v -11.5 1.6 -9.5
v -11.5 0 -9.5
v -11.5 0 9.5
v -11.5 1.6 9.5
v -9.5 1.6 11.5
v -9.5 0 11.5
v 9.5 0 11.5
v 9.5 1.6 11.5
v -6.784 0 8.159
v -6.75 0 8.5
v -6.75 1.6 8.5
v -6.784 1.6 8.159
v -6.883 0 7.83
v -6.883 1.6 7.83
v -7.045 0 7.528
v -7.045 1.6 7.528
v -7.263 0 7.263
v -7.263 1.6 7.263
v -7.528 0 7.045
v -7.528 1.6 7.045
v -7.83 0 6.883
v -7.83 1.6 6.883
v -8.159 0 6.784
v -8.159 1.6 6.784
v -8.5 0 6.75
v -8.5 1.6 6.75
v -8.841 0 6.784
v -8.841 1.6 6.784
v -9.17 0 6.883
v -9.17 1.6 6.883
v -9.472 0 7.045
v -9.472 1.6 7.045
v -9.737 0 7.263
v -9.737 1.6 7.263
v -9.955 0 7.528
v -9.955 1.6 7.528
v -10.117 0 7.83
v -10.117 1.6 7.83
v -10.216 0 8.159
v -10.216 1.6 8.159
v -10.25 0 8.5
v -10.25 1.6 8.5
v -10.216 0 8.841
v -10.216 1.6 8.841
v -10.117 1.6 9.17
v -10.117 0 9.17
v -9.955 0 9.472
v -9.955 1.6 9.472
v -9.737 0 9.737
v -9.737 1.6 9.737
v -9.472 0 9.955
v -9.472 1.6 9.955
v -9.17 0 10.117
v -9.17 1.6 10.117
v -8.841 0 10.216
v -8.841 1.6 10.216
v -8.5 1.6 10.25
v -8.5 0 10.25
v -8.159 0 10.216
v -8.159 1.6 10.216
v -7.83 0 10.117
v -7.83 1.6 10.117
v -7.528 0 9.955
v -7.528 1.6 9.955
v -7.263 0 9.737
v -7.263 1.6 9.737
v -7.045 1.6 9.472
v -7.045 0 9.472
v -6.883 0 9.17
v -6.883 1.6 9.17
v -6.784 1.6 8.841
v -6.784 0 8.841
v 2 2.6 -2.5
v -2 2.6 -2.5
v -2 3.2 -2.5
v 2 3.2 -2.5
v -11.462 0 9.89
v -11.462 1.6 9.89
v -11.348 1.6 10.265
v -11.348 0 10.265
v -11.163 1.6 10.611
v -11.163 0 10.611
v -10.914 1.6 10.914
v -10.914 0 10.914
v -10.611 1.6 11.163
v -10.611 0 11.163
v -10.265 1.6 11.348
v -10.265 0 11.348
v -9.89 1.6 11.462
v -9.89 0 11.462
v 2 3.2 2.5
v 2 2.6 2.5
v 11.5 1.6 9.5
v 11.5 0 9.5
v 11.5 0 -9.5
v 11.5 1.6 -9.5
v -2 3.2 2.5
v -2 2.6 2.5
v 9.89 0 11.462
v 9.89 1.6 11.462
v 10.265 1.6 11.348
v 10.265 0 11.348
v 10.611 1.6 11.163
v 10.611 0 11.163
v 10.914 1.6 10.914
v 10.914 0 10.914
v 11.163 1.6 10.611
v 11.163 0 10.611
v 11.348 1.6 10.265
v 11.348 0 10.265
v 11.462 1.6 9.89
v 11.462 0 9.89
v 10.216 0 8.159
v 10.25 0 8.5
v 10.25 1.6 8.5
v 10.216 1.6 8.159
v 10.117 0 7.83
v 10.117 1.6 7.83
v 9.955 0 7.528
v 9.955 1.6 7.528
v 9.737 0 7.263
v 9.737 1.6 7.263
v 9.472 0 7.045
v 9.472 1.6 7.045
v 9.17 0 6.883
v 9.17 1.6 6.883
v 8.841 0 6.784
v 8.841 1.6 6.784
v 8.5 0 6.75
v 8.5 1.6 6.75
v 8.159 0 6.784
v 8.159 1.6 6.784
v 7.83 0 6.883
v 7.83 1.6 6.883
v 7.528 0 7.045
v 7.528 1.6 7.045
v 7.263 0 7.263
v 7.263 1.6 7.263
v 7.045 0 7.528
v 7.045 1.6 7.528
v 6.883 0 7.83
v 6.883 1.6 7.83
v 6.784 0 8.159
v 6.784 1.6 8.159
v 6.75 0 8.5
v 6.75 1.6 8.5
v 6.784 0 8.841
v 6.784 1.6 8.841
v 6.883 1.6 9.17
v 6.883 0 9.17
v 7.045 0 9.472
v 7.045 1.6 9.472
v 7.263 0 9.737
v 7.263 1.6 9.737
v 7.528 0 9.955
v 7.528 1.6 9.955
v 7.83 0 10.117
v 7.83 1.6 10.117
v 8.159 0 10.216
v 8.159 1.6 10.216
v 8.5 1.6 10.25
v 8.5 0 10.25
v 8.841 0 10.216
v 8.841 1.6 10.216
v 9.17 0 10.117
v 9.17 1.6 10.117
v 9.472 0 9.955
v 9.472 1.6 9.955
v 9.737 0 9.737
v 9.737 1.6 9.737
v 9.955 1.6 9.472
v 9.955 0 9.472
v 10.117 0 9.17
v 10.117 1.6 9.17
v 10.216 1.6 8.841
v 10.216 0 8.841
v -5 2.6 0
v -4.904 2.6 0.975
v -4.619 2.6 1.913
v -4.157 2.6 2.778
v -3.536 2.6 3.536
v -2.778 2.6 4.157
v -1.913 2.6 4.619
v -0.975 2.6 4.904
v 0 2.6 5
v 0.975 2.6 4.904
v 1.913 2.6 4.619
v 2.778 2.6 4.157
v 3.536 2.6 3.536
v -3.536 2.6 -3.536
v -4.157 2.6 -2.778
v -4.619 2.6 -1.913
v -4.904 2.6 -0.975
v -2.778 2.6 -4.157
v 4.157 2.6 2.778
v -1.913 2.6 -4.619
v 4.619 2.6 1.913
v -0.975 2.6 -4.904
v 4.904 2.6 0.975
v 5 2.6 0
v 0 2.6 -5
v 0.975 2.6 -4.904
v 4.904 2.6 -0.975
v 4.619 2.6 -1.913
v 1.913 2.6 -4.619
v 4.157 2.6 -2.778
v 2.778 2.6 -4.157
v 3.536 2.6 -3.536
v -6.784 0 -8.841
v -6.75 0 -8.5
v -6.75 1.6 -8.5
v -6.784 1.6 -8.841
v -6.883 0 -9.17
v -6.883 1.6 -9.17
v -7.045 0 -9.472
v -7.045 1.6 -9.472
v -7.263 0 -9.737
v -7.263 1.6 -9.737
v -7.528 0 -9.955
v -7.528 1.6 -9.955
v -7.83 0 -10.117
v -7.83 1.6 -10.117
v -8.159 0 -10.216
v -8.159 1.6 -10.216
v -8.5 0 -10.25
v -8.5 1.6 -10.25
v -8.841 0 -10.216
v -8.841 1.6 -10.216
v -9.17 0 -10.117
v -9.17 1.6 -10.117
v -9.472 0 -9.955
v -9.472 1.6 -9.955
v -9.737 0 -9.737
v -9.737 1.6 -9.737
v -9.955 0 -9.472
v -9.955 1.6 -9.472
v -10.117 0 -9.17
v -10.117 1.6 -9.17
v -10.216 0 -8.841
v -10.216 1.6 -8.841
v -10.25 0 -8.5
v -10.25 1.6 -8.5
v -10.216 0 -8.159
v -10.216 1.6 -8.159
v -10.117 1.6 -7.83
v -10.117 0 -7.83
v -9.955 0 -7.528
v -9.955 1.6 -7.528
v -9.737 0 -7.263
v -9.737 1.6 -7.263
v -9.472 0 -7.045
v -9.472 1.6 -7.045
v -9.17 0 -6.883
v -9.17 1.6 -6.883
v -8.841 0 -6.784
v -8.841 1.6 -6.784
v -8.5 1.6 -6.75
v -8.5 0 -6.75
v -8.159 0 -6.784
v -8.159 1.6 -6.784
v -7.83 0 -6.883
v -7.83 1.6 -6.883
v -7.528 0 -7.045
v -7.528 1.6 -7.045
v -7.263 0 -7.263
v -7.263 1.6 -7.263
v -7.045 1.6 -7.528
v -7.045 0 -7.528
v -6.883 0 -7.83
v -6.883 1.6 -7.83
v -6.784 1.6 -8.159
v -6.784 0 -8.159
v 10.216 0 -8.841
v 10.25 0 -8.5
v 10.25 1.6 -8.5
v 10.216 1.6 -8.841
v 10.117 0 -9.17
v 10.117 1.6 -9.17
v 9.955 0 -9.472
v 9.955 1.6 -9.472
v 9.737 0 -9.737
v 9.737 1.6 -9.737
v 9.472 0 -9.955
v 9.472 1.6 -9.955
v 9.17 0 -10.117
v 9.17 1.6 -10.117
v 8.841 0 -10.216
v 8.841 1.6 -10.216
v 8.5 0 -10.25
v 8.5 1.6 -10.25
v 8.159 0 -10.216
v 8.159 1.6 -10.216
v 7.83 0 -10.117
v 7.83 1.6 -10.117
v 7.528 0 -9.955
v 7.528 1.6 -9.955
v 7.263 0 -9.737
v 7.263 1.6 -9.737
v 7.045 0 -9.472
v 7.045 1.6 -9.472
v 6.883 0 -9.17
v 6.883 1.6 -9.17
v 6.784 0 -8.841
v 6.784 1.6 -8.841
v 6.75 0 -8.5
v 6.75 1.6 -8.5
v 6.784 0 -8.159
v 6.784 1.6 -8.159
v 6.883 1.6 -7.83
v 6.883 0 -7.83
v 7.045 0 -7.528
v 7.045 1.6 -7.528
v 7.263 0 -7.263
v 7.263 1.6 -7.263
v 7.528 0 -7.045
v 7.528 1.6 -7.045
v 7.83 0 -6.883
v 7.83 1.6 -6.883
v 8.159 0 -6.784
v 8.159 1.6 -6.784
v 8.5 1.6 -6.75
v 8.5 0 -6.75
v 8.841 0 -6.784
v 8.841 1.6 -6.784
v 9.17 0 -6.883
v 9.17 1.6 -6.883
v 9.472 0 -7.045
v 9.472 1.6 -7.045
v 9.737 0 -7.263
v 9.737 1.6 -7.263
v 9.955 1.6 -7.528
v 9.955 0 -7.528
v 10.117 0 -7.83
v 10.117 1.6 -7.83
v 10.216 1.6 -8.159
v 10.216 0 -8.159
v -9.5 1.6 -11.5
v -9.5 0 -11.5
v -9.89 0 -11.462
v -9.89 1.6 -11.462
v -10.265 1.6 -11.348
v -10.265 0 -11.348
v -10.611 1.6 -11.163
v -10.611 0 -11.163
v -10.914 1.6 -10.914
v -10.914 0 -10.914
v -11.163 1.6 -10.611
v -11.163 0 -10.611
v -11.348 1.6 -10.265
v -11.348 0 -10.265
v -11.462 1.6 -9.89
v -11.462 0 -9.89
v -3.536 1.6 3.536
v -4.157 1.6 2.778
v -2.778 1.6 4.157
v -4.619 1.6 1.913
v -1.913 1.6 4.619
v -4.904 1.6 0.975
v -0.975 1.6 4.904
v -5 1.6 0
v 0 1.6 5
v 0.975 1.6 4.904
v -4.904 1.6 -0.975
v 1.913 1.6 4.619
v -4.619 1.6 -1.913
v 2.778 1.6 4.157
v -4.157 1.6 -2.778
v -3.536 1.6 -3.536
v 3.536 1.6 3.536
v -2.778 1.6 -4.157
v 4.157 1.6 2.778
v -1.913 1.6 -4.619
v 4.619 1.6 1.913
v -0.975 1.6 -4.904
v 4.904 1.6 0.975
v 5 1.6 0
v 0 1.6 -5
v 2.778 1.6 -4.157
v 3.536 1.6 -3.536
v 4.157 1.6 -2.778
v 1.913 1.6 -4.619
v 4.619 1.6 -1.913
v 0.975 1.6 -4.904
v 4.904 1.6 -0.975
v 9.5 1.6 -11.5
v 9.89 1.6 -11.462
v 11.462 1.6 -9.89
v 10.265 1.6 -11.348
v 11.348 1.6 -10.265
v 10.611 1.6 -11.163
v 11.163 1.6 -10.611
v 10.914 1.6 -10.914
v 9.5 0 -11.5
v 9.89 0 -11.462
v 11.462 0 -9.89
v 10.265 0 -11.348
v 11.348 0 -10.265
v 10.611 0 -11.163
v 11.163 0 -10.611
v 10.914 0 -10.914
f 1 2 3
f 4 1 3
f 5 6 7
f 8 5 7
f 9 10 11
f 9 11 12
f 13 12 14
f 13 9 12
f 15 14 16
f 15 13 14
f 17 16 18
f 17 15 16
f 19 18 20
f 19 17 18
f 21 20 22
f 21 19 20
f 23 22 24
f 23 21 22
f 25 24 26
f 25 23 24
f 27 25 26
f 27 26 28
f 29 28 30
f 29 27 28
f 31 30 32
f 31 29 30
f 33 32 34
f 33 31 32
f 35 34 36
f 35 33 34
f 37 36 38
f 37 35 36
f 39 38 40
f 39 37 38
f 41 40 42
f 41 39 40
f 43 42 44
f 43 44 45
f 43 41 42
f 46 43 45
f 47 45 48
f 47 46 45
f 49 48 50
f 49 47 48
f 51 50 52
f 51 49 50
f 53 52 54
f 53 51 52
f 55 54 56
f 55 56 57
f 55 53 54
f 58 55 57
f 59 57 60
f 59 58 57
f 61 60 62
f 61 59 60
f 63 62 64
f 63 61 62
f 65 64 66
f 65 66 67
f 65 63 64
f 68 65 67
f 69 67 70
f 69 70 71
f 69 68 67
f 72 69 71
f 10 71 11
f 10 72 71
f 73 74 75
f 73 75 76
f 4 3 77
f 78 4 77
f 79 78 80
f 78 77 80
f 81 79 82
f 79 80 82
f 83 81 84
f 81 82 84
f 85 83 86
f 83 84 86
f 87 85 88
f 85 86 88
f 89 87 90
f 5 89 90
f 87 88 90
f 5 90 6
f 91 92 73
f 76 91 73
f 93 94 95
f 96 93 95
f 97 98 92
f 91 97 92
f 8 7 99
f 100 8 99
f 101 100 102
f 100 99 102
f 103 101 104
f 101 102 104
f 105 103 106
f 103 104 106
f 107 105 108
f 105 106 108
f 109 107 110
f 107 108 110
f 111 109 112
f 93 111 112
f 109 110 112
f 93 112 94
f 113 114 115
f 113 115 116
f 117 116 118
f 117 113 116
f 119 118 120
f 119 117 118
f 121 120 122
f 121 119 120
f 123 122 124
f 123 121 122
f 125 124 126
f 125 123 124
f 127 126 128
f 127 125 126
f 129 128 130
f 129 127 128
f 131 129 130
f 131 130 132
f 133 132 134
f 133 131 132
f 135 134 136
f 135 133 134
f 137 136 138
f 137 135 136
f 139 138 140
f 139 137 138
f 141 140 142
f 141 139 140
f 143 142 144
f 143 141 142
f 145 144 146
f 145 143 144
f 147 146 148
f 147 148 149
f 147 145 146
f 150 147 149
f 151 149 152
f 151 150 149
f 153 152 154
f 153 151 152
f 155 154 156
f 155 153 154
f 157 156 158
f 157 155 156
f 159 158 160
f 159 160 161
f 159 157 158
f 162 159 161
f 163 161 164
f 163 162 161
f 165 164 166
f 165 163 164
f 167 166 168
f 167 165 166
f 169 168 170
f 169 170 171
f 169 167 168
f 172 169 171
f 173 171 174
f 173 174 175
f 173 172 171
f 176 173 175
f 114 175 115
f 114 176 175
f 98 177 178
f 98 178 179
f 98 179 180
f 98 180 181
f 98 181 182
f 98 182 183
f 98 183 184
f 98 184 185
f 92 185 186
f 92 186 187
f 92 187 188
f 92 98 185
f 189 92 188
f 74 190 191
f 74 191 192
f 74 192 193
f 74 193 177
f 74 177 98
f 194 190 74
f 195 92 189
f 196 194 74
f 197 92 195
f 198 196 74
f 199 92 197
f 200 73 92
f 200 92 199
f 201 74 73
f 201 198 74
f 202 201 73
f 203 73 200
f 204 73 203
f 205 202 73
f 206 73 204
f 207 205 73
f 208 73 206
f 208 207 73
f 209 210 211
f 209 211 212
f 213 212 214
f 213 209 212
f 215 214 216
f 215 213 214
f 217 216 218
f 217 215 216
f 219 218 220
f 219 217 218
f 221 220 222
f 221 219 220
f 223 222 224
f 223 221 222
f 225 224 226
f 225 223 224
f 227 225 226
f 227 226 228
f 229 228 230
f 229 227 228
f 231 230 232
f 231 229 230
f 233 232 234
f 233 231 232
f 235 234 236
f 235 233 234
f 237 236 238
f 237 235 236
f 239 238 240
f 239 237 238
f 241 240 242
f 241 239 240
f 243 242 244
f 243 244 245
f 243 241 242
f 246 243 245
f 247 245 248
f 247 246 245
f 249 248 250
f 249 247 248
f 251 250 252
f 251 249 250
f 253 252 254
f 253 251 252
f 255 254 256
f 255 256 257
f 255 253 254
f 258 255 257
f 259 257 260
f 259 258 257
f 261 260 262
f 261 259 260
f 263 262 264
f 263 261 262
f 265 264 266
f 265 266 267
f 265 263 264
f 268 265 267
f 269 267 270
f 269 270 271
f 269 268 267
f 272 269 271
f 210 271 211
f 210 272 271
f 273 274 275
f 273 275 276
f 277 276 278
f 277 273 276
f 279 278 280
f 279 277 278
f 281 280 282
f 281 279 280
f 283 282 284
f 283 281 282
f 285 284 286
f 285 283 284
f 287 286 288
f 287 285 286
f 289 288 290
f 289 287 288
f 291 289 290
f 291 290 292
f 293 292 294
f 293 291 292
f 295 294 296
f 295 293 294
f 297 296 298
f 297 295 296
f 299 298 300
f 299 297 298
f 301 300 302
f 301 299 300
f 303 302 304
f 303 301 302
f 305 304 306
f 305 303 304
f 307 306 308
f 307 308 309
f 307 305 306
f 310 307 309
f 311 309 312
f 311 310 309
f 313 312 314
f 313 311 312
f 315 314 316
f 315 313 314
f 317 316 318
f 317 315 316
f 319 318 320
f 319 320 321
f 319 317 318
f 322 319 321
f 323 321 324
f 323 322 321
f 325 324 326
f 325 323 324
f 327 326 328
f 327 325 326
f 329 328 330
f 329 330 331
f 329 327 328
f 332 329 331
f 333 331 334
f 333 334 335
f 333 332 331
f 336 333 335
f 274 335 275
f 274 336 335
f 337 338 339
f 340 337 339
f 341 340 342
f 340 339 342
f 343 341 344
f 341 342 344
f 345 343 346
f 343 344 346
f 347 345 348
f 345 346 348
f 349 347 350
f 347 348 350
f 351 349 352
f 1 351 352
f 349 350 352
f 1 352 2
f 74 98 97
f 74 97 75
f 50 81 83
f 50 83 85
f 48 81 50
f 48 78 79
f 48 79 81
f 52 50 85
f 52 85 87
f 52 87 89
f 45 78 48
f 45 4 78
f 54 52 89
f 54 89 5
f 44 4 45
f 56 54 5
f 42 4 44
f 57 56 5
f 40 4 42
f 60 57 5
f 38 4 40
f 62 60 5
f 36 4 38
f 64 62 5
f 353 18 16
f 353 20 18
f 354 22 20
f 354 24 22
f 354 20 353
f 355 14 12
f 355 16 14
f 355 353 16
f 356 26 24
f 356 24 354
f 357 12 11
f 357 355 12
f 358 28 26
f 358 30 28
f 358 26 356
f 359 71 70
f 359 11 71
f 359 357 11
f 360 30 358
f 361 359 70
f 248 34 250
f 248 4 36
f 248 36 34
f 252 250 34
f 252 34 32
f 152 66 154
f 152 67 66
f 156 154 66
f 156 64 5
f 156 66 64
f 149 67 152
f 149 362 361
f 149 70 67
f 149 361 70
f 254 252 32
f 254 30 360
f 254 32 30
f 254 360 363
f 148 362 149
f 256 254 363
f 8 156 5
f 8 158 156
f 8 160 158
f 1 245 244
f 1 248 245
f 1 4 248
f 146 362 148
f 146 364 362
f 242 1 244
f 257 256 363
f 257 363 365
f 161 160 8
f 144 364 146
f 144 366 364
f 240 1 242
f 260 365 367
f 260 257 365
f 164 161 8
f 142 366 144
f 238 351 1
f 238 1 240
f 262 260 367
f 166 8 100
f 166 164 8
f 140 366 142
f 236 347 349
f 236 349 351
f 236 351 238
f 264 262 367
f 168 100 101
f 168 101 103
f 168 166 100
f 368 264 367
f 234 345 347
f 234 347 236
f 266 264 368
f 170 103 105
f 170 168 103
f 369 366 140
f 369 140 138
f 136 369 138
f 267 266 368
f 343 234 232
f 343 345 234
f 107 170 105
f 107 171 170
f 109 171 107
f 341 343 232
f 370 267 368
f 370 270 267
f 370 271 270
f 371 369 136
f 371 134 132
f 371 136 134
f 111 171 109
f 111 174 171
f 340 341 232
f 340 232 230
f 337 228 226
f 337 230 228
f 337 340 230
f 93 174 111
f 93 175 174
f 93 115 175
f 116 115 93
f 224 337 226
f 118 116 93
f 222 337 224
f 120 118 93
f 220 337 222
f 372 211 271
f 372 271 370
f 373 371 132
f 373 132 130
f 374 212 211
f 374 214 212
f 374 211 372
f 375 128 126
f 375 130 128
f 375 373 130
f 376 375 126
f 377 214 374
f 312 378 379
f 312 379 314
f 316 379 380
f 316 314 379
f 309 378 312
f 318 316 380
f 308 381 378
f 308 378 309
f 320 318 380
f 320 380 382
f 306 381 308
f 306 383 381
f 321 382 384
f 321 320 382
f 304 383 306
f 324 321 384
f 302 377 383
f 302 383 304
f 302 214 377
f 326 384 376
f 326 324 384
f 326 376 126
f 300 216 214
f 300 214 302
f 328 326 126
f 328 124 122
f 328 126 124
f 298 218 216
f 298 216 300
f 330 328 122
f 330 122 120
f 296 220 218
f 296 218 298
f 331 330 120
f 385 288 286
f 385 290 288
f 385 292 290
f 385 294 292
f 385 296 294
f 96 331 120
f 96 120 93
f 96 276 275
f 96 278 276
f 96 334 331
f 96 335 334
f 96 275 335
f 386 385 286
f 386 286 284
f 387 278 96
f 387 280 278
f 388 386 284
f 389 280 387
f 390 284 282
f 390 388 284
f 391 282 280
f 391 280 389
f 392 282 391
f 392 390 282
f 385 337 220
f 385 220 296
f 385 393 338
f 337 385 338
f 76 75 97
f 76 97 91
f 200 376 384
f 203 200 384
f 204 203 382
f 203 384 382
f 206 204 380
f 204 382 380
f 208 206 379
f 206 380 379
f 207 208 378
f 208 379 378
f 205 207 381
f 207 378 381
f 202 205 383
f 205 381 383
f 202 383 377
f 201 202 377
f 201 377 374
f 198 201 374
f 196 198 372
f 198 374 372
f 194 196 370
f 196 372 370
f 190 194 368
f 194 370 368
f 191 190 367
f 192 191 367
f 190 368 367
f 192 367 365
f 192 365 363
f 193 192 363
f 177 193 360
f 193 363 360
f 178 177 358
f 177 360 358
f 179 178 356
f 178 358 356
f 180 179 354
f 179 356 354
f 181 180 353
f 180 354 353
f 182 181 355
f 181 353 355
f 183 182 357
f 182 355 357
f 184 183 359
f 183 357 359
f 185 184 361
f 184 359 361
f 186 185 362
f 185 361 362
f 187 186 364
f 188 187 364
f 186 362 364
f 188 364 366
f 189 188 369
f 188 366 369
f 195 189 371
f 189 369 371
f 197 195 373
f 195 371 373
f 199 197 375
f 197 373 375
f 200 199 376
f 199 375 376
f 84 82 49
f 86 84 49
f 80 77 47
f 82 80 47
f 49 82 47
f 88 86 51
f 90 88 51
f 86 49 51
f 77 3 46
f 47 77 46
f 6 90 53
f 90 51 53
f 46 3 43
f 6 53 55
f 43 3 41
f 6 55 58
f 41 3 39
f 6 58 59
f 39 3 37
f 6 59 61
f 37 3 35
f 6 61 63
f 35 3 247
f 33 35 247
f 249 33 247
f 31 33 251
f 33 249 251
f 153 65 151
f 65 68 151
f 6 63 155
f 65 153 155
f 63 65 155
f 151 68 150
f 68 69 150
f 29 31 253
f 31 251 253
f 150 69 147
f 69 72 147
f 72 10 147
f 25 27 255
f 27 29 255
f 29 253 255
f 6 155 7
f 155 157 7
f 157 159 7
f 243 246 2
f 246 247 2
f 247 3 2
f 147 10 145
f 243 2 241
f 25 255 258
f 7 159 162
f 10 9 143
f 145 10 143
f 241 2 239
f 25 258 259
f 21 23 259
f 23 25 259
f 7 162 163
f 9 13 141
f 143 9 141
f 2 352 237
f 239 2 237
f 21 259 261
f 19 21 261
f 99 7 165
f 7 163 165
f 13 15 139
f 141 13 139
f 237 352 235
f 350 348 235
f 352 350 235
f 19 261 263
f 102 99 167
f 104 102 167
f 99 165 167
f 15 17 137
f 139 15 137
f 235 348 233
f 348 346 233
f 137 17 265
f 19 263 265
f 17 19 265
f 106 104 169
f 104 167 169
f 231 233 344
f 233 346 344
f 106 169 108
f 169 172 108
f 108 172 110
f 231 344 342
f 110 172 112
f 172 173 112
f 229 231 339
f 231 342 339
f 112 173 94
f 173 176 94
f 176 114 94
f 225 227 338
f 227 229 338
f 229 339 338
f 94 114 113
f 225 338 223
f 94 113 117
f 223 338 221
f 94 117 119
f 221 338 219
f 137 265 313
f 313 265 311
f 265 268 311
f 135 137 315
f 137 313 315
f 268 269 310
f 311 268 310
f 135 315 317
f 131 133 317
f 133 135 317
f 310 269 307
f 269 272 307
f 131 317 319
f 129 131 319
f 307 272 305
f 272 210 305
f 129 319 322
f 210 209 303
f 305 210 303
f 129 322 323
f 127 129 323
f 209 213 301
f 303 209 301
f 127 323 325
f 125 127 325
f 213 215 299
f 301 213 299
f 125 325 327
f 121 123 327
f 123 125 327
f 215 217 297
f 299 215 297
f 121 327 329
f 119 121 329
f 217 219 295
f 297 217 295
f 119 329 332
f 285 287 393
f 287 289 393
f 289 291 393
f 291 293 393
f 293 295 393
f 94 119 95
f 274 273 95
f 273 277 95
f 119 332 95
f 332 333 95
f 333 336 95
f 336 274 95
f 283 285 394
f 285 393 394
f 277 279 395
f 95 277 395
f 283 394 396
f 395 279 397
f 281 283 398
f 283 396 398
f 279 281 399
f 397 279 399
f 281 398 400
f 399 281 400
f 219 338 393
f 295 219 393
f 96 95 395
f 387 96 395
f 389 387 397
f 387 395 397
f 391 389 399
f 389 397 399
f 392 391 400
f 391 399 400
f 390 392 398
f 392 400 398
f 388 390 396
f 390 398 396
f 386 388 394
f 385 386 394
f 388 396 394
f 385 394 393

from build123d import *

# Parameters (mm, degrees)
SKETCH1_R           = 1.75
BOSS_EXTRUDE1_DEPTH = 1.6
SKETCH2_W           = 4
SKETCH2_H           = 5
BOSS_EXTRUDE2_DEPTH = 1.6
SKETCH3_R           = 5
BOSS_EXTRUDE3_DEPTH = 1


with BuildPart() as part:
    # Sketch1 → Boss-Extrude1 (new body)
    with BuildSketch(Plane(origin=(0, 0, 0), x_dir=(1, 0, 0), z_dir=(0, 1, 0))):
        with BuildLine():
            Line((-9.5, -11.5), (9.5, -11.5))
            ThreePointArc((9.5, -11.5), (10.914213562, -10.914213562), (11.5, -9.5))
            Line((11.5, -9.5), (11.5, 9.5))
            ThreePointArc((11.5, 9.5), (10.914213562, 10.914213562), (9.5, 11.5))
            Line((9.5, 11.5), (-9.5, 11.5))
            ThreePointArc((-9.5, 11.5), (-10.914213562, 10.914213562), (-11.5, 9.5))
            Line((-11.5, 9.5), (-11.5, -9.5))
            ThreePointArc((-11.5, -9.5), (-10.914213562, -10.914213562), (-9.5, -11.5))
        make_face()
        with Locations((8.5, 8.5)):
            Circle(SKETCH1_R, mode=Mode.SUBTRACT)
        with Locations((8.5, -8.5)):
            Circle(SKETCH1_R, mode=Mode.SUBTRACT)
        with Locations((-8.5, -8.5)):
            Circle(SKETCH1_R, mode=Mode.SUBTRACT)
        with Locations((-8.5, 8.5)):
            Circle(SKETCH1_R, mode=Mode.SUBTRACT)
    extrude(amount=BOSS_EXTRUDE1_DEPTH)

    # Sketch2 → Boss-Extrude2 (add)
    with BuildSketch(Plane(origin=(0, 1.6, 0), x_dir=(1, 0, 0), z_dir=(0, 1, 0))):
        Rectangle(SKETCH2_W, SKETCH2_H)
    extrude(amount=BOSS_EXTRUDE2_DEPTH)

    # Sketch3 → Boss-Extrude3 (add)
    with BuildSketch(Plane(origin=(0, 1.6, 0), x_dir=(1, 0, 0), z_dir=(0, 1, 0))):
        Circle(SKETCH3_R)
    extrude(amount=BOSS_EXTRUDE3_DEPTH)


solid = part.part
